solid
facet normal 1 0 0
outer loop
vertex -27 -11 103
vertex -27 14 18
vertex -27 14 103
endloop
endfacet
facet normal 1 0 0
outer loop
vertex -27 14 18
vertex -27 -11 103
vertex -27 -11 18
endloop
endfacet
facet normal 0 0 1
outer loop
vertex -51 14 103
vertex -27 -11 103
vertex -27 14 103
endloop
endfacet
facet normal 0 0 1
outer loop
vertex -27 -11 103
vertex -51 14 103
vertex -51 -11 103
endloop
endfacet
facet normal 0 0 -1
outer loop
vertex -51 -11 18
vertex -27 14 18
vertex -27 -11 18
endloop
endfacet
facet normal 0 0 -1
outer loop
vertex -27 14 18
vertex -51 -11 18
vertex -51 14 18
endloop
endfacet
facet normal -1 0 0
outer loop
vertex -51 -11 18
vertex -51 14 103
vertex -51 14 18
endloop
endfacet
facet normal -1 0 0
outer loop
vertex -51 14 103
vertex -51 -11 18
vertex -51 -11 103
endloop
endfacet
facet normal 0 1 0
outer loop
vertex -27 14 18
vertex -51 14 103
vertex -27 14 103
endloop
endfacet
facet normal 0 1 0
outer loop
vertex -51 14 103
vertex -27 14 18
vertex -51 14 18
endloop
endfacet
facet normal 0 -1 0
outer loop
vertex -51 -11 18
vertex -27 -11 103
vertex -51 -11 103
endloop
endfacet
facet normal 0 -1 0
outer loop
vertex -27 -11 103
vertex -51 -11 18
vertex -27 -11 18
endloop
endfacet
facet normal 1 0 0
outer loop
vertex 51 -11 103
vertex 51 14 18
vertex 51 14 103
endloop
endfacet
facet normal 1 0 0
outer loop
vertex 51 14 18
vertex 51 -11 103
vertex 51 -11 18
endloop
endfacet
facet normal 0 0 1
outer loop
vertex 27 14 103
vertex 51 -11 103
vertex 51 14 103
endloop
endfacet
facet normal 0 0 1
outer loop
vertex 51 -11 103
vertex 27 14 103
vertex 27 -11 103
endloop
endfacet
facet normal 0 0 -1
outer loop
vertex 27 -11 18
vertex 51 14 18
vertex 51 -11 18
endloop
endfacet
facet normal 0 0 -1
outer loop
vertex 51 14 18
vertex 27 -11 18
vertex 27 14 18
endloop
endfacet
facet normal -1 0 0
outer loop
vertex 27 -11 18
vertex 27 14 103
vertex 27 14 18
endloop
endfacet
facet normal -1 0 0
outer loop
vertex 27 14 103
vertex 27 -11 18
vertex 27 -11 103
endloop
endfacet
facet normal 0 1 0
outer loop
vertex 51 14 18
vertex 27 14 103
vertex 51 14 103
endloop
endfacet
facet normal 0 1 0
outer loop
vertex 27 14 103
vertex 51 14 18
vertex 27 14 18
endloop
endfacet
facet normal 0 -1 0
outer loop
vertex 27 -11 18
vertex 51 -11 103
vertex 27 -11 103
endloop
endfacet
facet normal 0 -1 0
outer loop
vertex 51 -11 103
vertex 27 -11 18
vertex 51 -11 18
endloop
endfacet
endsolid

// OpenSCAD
// Bambu Studio: import together with deck as one object; change this mesh
// to Modifier. Coordinates match child_vtray_deck_t200.stl.
// This is a slicer volume, not an additional printed structural part.
for (sx=[-1,1])
    translate([sx>0 ? 27 : -51,-11,18]) cube([24,25,85]);
